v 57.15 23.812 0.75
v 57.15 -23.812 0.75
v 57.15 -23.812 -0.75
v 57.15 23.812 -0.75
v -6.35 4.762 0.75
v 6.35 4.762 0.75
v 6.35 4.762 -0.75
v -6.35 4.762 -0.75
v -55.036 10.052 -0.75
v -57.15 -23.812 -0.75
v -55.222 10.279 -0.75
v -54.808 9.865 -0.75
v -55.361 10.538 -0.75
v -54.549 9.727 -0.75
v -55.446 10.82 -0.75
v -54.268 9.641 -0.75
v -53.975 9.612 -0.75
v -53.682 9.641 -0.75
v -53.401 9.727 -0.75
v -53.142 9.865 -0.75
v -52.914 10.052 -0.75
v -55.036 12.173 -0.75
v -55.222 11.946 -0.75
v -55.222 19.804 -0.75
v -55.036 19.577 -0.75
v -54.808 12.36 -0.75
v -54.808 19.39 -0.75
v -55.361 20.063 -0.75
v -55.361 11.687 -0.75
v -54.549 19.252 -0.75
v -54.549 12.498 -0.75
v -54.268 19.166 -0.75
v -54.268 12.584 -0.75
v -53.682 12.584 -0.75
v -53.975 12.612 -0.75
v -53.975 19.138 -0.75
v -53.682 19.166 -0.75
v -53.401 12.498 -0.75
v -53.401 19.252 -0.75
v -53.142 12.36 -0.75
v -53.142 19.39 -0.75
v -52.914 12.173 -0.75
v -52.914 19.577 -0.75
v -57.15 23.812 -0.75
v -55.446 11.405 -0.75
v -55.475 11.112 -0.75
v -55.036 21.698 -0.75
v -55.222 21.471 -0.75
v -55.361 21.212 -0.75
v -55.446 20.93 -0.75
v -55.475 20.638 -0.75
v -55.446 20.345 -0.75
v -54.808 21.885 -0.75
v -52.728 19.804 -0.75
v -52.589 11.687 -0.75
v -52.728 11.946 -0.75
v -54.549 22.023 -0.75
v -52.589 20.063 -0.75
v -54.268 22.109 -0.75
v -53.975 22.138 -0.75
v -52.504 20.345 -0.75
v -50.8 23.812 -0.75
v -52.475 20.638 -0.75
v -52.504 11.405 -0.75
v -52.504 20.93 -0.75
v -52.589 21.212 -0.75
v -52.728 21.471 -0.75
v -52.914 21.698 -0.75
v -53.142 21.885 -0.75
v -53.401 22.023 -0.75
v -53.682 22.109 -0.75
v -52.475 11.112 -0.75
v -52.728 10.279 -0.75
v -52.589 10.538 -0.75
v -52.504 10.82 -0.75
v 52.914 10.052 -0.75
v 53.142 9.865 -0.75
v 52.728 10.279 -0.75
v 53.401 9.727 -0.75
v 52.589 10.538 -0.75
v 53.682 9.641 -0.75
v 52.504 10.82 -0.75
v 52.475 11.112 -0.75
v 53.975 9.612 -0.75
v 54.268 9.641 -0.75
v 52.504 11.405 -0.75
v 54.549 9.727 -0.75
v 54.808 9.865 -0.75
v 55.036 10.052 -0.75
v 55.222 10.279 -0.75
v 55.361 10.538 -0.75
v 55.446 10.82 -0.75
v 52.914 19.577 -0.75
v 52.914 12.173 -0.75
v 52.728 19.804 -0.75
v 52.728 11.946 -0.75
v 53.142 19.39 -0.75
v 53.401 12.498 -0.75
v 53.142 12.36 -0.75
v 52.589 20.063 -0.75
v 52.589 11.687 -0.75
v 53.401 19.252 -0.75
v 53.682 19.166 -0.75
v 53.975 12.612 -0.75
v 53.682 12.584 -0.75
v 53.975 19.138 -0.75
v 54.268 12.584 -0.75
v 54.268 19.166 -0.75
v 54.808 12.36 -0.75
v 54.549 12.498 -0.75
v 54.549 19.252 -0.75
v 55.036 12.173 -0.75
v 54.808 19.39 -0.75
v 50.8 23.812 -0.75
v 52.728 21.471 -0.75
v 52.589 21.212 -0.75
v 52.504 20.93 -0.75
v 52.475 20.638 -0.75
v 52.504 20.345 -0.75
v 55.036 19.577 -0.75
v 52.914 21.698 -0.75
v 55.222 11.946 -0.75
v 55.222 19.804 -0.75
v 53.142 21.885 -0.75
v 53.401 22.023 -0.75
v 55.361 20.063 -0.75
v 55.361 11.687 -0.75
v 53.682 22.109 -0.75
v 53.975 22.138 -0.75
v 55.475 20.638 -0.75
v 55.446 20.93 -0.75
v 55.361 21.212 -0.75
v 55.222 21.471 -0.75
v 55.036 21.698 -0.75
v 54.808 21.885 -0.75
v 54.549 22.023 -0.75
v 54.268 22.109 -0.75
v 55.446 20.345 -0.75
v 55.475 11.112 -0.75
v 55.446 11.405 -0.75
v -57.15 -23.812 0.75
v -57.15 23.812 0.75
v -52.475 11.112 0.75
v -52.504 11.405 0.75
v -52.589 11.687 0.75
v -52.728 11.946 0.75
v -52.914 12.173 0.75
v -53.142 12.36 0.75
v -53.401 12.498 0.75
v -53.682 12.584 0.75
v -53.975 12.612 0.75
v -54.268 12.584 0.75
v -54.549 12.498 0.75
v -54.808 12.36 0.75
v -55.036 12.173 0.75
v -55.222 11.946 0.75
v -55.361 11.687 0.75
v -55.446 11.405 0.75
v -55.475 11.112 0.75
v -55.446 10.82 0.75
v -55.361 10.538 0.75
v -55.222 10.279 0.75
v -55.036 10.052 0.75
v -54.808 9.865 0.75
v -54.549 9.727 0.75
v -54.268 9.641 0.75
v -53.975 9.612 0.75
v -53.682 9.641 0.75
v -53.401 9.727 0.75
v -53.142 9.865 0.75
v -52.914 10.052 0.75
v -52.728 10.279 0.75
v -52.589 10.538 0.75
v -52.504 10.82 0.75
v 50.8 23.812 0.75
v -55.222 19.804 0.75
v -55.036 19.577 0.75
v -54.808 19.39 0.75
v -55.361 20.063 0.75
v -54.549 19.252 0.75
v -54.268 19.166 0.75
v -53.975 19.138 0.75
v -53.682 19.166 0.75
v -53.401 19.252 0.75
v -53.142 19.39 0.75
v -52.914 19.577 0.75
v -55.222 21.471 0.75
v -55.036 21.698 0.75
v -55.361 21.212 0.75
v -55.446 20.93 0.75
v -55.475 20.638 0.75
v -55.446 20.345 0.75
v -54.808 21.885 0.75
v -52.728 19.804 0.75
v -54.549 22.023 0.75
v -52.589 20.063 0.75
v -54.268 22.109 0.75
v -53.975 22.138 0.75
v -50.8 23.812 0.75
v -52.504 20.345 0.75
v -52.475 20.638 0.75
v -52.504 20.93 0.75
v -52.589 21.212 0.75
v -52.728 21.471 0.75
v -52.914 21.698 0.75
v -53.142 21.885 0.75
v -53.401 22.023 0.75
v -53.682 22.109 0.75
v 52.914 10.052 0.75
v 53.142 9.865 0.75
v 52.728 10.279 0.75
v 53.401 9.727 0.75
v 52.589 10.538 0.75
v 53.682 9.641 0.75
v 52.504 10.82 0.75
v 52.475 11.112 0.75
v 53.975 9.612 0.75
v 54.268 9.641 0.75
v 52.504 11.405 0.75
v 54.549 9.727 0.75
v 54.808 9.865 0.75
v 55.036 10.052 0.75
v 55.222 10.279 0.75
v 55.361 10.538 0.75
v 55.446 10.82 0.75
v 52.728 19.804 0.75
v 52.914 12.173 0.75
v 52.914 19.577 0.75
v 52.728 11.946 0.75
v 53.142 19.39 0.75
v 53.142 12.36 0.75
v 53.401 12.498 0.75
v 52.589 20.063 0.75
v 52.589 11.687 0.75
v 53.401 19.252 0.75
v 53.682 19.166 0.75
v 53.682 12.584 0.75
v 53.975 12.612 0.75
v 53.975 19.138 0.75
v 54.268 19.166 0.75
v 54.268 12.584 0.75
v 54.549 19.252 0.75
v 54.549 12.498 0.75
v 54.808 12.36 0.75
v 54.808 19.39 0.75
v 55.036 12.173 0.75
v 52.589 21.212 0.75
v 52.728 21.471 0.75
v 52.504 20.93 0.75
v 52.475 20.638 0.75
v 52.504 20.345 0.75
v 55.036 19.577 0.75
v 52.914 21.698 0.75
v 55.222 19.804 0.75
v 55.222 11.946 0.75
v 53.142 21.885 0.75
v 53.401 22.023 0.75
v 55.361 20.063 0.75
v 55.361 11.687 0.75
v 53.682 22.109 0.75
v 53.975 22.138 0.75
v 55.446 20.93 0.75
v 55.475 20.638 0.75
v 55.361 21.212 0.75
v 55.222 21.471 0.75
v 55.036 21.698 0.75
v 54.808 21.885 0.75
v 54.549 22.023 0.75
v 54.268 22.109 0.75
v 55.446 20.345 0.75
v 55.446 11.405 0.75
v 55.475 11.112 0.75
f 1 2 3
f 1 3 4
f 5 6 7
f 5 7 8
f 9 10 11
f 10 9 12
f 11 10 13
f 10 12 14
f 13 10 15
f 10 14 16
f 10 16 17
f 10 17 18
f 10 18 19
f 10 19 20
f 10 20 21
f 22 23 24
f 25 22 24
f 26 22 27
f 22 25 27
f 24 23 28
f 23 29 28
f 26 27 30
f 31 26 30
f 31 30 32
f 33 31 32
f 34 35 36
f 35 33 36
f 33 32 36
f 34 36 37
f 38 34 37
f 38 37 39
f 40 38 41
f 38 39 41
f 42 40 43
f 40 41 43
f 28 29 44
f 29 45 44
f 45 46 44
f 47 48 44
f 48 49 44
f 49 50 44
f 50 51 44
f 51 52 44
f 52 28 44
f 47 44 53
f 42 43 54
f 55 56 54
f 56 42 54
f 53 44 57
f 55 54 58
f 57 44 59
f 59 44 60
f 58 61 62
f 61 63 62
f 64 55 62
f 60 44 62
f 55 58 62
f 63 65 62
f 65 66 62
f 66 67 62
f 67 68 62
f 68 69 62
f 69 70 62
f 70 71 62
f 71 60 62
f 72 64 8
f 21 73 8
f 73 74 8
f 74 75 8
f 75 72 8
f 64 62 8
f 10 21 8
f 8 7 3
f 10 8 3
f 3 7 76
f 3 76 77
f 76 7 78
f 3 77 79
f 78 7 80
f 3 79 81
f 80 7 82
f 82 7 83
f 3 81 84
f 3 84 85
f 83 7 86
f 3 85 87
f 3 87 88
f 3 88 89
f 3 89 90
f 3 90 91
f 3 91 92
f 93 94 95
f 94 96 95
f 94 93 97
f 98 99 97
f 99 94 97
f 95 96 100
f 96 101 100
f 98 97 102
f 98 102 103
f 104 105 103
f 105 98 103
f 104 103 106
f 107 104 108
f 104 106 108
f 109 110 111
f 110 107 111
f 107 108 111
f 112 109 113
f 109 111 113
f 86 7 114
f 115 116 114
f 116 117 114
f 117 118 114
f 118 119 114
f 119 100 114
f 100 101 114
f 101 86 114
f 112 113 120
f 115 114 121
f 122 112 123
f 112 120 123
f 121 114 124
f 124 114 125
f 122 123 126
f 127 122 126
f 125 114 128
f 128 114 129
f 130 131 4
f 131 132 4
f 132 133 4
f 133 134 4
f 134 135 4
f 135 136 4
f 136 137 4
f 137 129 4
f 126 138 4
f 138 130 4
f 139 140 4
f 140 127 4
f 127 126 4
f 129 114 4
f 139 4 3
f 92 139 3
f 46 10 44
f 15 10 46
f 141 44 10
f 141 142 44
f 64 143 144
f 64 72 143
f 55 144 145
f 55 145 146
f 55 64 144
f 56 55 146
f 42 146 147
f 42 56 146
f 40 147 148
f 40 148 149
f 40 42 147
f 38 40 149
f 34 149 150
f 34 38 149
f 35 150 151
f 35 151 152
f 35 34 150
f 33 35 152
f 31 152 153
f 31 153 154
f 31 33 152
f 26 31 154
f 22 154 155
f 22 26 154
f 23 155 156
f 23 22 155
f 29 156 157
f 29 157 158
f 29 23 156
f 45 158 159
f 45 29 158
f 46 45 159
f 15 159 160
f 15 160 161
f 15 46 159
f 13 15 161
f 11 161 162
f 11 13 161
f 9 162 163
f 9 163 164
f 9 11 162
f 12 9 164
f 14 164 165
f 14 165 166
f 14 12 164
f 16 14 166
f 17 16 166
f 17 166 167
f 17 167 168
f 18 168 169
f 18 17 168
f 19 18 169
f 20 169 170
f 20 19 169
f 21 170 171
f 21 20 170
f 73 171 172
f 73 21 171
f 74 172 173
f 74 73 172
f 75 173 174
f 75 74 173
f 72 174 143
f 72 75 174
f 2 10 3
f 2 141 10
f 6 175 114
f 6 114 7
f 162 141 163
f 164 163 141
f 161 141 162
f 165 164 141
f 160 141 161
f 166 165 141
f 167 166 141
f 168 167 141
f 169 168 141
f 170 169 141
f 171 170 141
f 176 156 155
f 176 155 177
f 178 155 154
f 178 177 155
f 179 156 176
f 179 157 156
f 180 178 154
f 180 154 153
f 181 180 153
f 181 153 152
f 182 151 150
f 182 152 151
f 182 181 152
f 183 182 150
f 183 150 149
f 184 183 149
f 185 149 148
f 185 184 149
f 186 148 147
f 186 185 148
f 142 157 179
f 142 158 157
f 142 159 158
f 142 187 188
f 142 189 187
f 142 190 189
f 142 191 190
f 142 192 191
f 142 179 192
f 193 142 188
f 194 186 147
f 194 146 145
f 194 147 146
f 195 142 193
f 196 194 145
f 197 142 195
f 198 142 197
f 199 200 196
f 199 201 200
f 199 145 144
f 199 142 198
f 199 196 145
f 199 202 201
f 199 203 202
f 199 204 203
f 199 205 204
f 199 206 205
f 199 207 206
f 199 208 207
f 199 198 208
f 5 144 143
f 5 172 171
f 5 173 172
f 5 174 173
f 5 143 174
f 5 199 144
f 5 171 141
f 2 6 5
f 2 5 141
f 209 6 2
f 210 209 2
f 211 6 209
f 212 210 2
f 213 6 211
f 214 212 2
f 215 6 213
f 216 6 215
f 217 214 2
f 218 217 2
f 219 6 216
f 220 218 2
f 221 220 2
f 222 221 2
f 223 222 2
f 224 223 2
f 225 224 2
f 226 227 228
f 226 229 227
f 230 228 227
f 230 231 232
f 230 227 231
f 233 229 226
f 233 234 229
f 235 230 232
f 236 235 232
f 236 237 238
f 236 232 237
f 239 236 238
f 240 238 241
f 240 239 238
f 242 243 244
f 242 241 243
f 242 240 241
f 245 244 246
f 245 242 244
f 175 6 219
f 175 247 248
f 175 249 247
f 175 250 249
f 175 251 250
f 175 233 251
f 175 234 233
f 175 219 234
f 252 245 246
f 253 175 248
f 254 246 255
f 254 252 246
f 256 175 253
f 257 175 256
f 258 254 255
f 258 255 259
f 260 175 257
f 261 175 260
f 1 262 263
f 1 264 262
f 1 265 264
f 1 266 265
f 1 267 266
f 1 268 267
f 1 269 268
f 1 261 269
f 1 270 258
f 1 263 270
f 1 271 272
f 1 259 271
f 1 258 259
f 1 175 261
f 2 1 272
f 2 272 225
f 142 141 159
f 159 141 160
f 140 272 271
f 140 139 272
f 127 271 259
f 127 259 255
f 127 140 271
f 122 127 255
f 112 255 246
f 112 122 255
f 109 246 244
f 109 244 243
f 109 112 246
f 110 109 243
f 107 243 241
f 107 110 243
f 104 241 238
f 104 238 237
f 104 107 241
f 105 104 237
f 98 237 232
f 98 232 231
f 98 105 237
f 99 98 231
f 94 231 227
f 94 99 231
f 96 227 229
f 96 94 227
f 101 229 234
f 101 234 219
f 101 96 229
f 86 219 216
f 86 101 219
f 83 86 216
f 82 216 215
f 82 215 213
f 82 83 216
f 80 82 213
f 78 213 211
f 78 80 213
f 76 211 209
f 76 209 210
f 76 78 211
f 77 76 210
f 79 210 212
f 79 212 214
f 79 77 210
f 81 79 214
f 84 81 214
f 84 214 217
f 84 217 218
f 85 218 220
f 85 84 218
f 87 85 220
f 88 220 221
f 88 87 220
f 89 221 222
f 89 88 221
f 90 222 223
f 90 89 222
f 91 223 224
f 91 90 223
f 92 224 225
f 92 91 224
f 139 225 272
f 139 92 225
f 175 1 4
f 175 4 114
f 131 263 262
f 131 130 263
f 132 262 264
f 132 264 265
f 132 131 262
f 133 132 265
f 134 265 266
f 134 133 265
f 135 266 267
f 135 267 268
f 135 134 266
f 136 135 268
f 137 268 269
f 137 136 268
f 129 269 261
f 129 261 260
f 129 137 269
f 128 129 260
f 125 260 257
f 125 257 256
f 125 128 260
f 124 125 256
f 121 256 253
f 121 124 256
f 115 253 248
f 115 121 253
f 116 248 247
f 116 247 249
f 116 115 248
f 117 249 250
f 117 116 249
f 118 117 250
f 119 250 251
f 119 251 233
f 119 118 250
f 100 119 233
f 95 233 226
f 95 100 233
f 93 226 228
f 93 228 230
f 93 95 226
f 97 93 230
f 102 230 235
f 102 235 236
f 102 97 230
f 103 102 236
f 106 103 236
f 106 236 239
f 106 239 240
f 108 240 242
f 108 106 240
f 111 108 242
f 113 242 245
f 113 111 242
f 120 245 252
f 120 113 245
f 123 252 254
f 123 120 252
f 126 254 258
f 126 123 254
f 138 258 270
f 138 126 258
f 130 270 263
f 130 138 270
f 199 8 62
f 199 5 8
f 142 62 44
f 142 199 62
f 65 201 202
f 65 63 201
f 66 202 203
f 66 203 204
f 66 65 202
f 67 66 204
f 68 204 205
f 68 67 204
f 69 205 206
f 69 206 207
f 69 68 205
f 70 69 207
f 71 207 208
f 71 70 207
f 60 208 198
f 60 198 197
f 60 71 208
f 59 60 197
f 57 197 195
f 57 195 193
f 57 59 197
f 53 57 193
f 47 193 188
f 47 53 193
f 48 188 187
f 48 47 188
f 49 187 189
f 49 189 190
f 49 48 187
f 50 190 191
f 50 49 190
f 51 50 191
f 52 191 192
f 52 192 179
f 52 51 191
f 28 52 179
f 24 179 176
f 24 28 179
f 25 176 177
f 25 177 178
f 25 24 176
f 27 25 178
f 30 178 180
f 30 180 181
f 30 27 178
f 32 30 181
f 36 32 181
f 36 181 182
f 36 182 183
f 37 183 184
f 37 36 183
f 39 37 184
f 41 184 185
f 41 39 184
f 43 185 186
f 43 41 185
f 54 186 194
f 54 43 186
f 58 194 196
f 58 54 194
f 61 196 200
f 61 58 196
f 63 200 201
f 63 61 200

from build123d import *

# Parameters (mm, degrees)
SKETCH1_R           = 1.5
BOSS_EXTRUDE1_DEPTH = 0.75


with BuildPart() as part:
    # Sketch1 → Boss-Extrude1 (new body, symmetric)
    with BuildSketch(Plane.XY):
        Polygon((-57.15, -23.8125), (57.15, -23.8125), (57.15, 23.8125), (50.8, 23.8125), (6.35, 4.7625), (-6.35, 4.7625), (-50.8, 23.8125), (-57.15, 23.8125), align=None)
        with Locations((53.975, 20.6375)):
            Circle(SKETCH1_R, mode=Mode.SUBTRACT)
        with Locations((53.975, 11.1125)):
            Circle(SKETCH1_R, mode=Mode.SUBTRACT)
        with Locations((-53.975, 20.6375)):
            Circle(SKETCH1_R, mode=Mode.SUBTRACT)
        with Locations((-53.975, 11.1125)):
            Circle(SKETCH1_R, mode=Mode.SUBTRACT)
    extrude(amount=BOSS_EXTRUDE1_DEPTH, both=True)


solid = part.part
